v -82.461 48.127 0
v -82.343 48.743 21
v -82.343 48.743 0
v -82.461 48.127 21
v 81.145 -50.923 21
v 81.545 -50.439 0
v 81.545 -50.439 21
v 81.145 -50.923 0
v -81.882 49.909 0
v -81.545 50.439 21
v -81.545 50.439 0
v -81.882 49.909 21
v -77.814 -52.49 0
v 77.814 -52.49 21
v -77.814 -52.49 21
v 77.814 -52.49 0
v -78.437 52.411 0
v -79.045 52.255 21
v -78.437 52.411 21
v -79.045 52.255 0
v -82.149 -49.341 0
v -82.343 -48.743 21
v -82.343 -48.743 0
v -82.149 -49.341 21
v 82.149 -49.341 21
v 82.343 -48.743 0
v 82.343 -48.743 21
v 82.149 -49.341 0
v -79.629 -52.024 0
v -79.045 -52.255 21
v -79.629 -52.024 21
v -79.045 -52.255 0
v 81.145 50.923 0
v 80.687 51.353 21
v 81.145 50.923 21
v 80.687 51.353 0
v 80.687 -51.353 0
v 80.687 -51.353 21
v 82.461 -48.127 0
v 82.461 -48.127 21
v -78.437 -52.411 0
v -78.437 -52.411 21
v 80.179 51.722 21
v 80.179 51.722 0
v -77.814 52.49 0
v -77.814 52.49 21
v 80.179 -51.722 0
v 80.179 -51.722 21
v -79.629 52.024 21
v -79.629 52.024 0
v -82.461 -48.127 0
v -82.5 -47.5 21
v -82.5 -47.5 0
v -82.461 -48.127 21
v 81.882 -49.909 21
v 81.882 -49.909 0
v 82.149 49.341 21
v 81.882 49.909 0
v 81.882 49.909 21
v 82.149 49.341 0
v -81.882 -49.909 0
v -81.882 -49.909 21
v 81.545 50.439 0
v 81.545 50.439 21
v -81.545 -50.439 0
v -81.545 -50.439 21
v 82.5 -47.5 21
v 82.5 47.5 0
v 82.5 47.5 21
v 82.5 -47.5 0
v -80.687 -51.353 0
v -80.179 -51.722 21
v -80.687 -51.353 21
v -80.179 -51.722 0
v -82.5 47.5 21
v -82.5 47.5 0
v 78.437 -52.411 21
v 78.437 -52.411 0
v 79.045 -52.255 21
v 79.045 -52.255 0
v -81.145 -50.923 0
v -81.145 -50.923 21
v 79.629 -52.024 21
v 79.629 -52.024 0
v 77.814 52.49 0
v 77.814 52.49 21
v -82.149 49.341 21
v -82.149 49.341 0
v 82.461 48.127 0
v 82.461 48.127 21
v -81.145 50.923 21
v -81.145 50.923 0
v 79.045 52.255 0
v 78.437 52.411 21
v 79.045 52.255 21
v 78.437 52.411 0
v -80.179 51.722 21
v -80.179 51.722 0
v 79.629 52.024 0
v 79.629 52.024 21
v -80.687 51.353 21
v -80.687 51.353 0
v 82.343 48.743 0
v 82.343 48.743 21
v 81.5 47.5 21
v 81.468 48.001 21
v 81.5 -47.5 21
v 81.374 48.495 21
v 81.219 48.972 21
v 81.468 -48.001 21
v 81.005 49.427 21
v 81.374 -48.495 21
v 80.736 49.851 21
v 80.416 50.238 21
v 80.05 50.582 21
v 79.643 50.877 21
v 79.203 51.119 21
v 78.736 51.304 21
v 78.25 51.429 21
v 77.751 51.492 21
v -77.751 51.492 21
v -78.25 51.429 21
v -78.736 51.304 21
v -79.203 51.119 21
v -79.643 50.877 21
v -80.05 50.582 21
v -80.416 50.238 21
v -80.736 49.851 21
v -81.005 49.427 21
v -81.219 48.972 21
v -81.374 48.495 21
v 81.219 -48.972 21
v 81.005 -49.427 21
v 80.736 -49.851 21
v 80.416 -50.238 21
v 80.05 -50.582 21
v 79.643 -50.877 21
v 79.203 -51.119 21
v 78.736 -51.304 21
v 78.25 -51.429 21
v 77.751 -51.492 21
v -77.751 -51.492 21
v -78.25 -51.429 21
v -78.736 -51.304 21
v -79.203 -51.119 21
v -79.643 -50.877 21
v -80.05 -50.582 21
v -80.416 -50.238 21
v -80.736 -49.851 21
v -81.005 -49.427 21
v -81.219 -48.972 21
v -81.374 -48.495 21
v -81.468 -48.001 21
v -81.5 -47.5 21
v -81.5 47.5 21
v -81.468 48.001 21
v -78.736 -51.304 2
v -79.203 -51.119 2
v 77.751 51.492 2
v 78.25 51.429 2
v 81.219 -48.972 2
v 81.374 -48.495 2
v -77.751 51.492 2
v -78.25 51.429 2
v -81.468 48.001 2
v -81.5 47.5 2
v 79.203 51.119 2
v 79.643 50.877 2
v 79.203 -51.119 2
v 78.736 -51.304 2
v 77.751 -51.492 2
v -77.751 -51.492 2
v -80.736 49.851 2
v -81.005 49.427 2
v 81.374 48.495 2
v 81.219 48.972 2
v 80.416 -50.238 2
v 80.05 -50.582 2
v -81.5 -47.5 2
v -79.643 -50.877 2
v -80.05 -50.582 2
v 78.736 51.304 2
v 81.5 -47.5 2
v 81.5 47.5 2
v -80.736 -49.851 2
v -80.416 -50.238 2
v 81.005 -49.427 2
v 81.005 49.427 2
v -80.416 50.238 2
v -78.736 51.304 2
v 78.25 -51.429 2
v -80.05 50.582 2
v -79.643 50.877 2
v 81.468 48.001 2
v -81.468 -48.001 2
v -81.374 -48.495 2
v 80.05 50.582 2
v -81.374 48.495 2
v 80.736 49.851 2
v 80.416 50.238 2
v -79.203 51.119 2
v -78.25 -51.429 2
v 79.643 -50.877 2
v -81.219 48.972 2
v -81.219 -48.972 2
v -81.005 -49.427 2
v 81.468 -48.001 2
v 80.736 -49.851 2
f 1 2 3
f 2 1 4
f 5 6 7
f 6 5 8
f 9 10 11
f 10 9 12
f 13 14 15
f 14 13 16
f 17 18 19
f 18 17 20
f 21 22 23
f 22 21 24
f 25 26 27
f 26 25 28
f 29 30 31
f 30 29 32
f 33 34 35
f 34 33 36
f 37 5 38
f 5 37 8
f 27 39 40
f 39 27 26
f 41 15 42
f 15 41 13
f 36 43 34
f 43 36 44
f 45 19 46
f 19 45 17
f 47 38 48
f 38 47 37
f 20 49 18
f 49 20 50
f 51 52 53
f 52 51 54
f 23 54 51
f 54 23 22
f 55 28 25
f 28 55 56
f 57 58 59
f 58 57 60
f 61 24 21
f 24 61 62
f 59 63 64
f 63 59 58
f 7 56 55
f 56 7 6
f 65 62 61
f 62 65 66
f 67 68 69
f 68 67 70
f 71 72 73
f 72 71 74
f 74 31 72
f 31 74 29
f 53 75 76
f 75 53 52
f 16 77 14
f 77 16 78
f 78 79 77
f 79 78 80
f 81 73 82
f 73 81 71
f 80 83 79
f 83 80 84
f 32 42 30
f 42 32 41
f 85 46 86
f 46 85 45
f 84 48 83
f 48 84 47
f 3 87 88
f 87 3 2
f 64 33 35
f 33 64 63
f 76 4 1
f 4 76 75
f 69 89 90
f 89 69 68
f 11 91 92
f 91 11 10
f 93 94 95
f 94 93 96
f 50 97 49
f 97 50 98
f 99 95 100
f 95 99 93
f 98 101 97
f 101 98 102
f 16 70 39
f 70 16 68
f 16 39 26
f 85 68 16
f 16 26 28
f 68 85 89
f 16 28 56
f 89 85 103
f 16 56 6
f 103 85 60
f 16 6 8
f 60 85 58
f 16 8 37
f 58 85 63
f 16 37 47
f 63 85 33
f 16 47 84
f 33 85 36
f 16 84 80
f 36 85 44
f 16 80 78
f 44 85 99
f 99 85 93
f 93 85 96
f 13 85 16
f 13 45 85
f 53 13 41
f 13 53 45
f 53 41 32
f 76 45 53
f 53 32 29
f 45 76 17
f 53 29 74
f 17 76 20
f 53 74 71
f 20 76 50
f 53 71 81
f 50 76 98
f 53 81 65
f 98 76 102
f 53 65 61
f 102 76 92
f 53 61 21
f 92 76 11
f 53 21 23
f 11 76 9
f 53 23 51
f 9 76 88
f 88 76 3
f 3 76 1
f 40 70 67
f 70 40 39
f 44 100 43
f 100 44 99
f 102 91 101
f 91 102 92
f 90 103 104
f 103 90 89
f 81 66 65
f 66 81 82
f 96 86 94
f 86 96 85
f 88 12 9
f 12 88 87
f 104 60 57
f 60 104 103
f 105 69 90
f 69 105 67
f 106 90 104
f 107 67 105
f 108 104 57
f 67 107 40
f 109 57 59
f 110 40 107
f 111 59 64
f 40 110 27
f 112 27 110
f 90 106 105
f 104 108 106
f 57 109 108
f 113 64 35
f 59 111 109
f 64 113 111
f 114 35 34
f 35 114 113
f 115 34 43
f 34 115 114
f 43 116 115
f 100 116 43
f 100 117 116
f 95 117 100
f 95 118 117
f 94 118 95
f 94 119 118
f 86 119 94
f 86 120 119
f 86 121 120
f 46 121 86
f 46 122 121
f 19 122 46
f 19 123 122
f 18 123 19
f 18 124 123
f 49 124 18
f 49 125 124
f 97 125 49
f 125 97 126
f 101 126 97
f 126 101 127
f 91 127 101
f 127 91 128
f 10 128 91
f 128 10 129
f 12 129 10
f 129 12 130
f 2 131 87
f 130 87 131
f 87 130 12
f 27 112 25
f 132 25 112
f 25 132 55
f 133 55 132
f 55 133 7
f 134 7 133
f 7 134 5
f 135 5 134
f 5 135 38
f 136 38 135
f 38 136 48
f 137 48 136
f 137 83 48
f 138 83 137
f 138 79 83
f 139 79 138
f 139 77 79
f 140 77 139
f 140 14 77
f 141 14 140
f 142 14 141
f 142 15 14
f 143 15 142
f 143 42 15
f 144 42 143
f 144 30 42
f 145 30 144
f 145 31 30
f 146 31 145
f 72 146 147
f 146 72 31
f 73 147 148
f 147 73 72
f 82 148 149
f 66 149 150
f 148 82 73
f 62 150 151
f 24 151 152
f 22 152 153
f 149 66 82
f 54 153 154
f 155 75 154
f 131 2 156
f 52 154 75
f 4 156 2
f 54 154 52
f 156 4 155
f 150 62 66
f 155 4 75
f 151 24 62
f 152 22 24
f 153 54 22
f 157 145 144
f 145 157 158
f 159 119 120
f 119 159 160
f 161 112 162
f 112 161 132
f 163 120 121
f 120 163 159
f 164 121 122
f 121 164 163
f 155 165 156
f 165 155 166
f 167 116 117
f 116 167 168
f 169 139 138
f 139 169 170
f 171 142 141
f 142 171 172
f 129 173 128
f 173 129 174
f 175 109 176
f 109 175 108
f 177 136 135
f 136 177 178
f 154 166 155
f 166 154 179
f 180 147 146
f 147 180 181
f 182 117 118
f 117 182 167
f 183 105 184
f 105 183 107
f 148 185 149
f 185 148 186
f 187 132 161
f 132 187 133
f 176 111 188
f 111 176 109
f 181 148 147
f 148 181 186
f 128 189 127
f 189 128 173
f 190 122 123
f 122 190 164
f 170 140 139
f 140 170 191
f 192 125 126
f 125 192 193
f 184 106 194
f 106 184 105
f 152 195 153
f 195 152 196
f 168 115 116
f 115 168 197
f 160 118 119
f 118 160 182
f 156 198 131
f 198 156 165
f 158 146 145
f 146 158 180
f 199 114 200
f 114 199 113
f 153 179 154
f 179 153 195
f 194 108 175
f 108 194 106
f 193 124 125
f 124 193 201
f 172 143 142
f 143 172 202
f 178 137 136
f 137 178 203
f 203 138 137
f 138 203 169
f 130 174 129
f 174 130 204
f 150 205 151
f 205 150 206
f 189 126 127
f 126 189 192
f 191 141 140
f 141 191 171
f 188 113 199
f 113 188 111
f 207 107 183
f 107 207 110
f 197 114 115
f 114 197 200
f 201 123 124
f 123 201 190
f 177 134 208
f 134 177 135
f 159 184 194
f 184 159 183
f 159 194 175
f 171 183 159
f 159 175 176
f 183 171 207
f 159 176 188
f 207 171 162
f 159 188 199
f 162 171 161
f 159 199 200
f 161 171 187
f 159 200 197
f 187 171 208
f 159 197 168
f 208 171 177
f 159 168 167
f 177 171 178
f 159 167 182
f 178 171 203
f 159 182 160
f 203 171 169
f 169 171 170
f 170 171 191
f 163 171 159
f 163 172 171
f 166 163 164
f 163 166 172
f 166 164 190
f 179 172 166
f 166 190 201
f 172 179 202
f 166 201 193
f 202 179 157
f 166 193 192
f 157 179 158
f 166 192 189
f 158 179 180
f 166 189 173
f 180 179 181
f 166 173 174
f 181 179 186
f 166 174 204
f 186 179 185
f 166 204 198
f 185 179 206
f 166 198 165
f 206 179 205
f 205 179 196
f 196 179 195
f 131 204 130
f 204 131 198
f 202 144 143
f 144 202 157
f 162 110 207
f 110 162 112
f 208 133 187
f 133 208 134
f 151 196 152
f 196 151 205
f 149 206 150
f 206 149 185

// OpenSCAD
$fn = 50;


difference() {
	union() {
		hull() {
			translate(v = [-77.5000000000, 47.5000000000, 0]) {
				cylinder(h = 21, r = 5);
			}
			translate(v = [77.5000000000, 47.5000000000, 0]) {
				cylinder(h = 21, r = 5);
			}
			translate(v = [-77.5000000000, -47.5000000000, 0]) {
				cylinder(h = 21, r = 5);
			}
			translate(v = [77.5000000000, -47.5000000000, 0]) {
				cylinder(h = 21, r = 5);
			}
		}
	}
	union() {
		translate(v = [0, 0, 2]) {
			hull() {
				translate(v = [-77.5000000000, 47.5000000000, 0]) {
					cylinder(h = 19, r = 4);
				}
				translate(v = [77.5000000000, 47.5000000000, 0]) {
					cylinder(h = 19, r = 4);
				}
				translate(v = [-77.5000000000, -47.5000000000, 0]) {
					cylinder(h = 19, r = 4);
				}
				translate(v = [77.5000000000, -47.5000000000, 0]) {
					cylinder(h = 19, r = 4);
				}
			}
		}
	}
}
